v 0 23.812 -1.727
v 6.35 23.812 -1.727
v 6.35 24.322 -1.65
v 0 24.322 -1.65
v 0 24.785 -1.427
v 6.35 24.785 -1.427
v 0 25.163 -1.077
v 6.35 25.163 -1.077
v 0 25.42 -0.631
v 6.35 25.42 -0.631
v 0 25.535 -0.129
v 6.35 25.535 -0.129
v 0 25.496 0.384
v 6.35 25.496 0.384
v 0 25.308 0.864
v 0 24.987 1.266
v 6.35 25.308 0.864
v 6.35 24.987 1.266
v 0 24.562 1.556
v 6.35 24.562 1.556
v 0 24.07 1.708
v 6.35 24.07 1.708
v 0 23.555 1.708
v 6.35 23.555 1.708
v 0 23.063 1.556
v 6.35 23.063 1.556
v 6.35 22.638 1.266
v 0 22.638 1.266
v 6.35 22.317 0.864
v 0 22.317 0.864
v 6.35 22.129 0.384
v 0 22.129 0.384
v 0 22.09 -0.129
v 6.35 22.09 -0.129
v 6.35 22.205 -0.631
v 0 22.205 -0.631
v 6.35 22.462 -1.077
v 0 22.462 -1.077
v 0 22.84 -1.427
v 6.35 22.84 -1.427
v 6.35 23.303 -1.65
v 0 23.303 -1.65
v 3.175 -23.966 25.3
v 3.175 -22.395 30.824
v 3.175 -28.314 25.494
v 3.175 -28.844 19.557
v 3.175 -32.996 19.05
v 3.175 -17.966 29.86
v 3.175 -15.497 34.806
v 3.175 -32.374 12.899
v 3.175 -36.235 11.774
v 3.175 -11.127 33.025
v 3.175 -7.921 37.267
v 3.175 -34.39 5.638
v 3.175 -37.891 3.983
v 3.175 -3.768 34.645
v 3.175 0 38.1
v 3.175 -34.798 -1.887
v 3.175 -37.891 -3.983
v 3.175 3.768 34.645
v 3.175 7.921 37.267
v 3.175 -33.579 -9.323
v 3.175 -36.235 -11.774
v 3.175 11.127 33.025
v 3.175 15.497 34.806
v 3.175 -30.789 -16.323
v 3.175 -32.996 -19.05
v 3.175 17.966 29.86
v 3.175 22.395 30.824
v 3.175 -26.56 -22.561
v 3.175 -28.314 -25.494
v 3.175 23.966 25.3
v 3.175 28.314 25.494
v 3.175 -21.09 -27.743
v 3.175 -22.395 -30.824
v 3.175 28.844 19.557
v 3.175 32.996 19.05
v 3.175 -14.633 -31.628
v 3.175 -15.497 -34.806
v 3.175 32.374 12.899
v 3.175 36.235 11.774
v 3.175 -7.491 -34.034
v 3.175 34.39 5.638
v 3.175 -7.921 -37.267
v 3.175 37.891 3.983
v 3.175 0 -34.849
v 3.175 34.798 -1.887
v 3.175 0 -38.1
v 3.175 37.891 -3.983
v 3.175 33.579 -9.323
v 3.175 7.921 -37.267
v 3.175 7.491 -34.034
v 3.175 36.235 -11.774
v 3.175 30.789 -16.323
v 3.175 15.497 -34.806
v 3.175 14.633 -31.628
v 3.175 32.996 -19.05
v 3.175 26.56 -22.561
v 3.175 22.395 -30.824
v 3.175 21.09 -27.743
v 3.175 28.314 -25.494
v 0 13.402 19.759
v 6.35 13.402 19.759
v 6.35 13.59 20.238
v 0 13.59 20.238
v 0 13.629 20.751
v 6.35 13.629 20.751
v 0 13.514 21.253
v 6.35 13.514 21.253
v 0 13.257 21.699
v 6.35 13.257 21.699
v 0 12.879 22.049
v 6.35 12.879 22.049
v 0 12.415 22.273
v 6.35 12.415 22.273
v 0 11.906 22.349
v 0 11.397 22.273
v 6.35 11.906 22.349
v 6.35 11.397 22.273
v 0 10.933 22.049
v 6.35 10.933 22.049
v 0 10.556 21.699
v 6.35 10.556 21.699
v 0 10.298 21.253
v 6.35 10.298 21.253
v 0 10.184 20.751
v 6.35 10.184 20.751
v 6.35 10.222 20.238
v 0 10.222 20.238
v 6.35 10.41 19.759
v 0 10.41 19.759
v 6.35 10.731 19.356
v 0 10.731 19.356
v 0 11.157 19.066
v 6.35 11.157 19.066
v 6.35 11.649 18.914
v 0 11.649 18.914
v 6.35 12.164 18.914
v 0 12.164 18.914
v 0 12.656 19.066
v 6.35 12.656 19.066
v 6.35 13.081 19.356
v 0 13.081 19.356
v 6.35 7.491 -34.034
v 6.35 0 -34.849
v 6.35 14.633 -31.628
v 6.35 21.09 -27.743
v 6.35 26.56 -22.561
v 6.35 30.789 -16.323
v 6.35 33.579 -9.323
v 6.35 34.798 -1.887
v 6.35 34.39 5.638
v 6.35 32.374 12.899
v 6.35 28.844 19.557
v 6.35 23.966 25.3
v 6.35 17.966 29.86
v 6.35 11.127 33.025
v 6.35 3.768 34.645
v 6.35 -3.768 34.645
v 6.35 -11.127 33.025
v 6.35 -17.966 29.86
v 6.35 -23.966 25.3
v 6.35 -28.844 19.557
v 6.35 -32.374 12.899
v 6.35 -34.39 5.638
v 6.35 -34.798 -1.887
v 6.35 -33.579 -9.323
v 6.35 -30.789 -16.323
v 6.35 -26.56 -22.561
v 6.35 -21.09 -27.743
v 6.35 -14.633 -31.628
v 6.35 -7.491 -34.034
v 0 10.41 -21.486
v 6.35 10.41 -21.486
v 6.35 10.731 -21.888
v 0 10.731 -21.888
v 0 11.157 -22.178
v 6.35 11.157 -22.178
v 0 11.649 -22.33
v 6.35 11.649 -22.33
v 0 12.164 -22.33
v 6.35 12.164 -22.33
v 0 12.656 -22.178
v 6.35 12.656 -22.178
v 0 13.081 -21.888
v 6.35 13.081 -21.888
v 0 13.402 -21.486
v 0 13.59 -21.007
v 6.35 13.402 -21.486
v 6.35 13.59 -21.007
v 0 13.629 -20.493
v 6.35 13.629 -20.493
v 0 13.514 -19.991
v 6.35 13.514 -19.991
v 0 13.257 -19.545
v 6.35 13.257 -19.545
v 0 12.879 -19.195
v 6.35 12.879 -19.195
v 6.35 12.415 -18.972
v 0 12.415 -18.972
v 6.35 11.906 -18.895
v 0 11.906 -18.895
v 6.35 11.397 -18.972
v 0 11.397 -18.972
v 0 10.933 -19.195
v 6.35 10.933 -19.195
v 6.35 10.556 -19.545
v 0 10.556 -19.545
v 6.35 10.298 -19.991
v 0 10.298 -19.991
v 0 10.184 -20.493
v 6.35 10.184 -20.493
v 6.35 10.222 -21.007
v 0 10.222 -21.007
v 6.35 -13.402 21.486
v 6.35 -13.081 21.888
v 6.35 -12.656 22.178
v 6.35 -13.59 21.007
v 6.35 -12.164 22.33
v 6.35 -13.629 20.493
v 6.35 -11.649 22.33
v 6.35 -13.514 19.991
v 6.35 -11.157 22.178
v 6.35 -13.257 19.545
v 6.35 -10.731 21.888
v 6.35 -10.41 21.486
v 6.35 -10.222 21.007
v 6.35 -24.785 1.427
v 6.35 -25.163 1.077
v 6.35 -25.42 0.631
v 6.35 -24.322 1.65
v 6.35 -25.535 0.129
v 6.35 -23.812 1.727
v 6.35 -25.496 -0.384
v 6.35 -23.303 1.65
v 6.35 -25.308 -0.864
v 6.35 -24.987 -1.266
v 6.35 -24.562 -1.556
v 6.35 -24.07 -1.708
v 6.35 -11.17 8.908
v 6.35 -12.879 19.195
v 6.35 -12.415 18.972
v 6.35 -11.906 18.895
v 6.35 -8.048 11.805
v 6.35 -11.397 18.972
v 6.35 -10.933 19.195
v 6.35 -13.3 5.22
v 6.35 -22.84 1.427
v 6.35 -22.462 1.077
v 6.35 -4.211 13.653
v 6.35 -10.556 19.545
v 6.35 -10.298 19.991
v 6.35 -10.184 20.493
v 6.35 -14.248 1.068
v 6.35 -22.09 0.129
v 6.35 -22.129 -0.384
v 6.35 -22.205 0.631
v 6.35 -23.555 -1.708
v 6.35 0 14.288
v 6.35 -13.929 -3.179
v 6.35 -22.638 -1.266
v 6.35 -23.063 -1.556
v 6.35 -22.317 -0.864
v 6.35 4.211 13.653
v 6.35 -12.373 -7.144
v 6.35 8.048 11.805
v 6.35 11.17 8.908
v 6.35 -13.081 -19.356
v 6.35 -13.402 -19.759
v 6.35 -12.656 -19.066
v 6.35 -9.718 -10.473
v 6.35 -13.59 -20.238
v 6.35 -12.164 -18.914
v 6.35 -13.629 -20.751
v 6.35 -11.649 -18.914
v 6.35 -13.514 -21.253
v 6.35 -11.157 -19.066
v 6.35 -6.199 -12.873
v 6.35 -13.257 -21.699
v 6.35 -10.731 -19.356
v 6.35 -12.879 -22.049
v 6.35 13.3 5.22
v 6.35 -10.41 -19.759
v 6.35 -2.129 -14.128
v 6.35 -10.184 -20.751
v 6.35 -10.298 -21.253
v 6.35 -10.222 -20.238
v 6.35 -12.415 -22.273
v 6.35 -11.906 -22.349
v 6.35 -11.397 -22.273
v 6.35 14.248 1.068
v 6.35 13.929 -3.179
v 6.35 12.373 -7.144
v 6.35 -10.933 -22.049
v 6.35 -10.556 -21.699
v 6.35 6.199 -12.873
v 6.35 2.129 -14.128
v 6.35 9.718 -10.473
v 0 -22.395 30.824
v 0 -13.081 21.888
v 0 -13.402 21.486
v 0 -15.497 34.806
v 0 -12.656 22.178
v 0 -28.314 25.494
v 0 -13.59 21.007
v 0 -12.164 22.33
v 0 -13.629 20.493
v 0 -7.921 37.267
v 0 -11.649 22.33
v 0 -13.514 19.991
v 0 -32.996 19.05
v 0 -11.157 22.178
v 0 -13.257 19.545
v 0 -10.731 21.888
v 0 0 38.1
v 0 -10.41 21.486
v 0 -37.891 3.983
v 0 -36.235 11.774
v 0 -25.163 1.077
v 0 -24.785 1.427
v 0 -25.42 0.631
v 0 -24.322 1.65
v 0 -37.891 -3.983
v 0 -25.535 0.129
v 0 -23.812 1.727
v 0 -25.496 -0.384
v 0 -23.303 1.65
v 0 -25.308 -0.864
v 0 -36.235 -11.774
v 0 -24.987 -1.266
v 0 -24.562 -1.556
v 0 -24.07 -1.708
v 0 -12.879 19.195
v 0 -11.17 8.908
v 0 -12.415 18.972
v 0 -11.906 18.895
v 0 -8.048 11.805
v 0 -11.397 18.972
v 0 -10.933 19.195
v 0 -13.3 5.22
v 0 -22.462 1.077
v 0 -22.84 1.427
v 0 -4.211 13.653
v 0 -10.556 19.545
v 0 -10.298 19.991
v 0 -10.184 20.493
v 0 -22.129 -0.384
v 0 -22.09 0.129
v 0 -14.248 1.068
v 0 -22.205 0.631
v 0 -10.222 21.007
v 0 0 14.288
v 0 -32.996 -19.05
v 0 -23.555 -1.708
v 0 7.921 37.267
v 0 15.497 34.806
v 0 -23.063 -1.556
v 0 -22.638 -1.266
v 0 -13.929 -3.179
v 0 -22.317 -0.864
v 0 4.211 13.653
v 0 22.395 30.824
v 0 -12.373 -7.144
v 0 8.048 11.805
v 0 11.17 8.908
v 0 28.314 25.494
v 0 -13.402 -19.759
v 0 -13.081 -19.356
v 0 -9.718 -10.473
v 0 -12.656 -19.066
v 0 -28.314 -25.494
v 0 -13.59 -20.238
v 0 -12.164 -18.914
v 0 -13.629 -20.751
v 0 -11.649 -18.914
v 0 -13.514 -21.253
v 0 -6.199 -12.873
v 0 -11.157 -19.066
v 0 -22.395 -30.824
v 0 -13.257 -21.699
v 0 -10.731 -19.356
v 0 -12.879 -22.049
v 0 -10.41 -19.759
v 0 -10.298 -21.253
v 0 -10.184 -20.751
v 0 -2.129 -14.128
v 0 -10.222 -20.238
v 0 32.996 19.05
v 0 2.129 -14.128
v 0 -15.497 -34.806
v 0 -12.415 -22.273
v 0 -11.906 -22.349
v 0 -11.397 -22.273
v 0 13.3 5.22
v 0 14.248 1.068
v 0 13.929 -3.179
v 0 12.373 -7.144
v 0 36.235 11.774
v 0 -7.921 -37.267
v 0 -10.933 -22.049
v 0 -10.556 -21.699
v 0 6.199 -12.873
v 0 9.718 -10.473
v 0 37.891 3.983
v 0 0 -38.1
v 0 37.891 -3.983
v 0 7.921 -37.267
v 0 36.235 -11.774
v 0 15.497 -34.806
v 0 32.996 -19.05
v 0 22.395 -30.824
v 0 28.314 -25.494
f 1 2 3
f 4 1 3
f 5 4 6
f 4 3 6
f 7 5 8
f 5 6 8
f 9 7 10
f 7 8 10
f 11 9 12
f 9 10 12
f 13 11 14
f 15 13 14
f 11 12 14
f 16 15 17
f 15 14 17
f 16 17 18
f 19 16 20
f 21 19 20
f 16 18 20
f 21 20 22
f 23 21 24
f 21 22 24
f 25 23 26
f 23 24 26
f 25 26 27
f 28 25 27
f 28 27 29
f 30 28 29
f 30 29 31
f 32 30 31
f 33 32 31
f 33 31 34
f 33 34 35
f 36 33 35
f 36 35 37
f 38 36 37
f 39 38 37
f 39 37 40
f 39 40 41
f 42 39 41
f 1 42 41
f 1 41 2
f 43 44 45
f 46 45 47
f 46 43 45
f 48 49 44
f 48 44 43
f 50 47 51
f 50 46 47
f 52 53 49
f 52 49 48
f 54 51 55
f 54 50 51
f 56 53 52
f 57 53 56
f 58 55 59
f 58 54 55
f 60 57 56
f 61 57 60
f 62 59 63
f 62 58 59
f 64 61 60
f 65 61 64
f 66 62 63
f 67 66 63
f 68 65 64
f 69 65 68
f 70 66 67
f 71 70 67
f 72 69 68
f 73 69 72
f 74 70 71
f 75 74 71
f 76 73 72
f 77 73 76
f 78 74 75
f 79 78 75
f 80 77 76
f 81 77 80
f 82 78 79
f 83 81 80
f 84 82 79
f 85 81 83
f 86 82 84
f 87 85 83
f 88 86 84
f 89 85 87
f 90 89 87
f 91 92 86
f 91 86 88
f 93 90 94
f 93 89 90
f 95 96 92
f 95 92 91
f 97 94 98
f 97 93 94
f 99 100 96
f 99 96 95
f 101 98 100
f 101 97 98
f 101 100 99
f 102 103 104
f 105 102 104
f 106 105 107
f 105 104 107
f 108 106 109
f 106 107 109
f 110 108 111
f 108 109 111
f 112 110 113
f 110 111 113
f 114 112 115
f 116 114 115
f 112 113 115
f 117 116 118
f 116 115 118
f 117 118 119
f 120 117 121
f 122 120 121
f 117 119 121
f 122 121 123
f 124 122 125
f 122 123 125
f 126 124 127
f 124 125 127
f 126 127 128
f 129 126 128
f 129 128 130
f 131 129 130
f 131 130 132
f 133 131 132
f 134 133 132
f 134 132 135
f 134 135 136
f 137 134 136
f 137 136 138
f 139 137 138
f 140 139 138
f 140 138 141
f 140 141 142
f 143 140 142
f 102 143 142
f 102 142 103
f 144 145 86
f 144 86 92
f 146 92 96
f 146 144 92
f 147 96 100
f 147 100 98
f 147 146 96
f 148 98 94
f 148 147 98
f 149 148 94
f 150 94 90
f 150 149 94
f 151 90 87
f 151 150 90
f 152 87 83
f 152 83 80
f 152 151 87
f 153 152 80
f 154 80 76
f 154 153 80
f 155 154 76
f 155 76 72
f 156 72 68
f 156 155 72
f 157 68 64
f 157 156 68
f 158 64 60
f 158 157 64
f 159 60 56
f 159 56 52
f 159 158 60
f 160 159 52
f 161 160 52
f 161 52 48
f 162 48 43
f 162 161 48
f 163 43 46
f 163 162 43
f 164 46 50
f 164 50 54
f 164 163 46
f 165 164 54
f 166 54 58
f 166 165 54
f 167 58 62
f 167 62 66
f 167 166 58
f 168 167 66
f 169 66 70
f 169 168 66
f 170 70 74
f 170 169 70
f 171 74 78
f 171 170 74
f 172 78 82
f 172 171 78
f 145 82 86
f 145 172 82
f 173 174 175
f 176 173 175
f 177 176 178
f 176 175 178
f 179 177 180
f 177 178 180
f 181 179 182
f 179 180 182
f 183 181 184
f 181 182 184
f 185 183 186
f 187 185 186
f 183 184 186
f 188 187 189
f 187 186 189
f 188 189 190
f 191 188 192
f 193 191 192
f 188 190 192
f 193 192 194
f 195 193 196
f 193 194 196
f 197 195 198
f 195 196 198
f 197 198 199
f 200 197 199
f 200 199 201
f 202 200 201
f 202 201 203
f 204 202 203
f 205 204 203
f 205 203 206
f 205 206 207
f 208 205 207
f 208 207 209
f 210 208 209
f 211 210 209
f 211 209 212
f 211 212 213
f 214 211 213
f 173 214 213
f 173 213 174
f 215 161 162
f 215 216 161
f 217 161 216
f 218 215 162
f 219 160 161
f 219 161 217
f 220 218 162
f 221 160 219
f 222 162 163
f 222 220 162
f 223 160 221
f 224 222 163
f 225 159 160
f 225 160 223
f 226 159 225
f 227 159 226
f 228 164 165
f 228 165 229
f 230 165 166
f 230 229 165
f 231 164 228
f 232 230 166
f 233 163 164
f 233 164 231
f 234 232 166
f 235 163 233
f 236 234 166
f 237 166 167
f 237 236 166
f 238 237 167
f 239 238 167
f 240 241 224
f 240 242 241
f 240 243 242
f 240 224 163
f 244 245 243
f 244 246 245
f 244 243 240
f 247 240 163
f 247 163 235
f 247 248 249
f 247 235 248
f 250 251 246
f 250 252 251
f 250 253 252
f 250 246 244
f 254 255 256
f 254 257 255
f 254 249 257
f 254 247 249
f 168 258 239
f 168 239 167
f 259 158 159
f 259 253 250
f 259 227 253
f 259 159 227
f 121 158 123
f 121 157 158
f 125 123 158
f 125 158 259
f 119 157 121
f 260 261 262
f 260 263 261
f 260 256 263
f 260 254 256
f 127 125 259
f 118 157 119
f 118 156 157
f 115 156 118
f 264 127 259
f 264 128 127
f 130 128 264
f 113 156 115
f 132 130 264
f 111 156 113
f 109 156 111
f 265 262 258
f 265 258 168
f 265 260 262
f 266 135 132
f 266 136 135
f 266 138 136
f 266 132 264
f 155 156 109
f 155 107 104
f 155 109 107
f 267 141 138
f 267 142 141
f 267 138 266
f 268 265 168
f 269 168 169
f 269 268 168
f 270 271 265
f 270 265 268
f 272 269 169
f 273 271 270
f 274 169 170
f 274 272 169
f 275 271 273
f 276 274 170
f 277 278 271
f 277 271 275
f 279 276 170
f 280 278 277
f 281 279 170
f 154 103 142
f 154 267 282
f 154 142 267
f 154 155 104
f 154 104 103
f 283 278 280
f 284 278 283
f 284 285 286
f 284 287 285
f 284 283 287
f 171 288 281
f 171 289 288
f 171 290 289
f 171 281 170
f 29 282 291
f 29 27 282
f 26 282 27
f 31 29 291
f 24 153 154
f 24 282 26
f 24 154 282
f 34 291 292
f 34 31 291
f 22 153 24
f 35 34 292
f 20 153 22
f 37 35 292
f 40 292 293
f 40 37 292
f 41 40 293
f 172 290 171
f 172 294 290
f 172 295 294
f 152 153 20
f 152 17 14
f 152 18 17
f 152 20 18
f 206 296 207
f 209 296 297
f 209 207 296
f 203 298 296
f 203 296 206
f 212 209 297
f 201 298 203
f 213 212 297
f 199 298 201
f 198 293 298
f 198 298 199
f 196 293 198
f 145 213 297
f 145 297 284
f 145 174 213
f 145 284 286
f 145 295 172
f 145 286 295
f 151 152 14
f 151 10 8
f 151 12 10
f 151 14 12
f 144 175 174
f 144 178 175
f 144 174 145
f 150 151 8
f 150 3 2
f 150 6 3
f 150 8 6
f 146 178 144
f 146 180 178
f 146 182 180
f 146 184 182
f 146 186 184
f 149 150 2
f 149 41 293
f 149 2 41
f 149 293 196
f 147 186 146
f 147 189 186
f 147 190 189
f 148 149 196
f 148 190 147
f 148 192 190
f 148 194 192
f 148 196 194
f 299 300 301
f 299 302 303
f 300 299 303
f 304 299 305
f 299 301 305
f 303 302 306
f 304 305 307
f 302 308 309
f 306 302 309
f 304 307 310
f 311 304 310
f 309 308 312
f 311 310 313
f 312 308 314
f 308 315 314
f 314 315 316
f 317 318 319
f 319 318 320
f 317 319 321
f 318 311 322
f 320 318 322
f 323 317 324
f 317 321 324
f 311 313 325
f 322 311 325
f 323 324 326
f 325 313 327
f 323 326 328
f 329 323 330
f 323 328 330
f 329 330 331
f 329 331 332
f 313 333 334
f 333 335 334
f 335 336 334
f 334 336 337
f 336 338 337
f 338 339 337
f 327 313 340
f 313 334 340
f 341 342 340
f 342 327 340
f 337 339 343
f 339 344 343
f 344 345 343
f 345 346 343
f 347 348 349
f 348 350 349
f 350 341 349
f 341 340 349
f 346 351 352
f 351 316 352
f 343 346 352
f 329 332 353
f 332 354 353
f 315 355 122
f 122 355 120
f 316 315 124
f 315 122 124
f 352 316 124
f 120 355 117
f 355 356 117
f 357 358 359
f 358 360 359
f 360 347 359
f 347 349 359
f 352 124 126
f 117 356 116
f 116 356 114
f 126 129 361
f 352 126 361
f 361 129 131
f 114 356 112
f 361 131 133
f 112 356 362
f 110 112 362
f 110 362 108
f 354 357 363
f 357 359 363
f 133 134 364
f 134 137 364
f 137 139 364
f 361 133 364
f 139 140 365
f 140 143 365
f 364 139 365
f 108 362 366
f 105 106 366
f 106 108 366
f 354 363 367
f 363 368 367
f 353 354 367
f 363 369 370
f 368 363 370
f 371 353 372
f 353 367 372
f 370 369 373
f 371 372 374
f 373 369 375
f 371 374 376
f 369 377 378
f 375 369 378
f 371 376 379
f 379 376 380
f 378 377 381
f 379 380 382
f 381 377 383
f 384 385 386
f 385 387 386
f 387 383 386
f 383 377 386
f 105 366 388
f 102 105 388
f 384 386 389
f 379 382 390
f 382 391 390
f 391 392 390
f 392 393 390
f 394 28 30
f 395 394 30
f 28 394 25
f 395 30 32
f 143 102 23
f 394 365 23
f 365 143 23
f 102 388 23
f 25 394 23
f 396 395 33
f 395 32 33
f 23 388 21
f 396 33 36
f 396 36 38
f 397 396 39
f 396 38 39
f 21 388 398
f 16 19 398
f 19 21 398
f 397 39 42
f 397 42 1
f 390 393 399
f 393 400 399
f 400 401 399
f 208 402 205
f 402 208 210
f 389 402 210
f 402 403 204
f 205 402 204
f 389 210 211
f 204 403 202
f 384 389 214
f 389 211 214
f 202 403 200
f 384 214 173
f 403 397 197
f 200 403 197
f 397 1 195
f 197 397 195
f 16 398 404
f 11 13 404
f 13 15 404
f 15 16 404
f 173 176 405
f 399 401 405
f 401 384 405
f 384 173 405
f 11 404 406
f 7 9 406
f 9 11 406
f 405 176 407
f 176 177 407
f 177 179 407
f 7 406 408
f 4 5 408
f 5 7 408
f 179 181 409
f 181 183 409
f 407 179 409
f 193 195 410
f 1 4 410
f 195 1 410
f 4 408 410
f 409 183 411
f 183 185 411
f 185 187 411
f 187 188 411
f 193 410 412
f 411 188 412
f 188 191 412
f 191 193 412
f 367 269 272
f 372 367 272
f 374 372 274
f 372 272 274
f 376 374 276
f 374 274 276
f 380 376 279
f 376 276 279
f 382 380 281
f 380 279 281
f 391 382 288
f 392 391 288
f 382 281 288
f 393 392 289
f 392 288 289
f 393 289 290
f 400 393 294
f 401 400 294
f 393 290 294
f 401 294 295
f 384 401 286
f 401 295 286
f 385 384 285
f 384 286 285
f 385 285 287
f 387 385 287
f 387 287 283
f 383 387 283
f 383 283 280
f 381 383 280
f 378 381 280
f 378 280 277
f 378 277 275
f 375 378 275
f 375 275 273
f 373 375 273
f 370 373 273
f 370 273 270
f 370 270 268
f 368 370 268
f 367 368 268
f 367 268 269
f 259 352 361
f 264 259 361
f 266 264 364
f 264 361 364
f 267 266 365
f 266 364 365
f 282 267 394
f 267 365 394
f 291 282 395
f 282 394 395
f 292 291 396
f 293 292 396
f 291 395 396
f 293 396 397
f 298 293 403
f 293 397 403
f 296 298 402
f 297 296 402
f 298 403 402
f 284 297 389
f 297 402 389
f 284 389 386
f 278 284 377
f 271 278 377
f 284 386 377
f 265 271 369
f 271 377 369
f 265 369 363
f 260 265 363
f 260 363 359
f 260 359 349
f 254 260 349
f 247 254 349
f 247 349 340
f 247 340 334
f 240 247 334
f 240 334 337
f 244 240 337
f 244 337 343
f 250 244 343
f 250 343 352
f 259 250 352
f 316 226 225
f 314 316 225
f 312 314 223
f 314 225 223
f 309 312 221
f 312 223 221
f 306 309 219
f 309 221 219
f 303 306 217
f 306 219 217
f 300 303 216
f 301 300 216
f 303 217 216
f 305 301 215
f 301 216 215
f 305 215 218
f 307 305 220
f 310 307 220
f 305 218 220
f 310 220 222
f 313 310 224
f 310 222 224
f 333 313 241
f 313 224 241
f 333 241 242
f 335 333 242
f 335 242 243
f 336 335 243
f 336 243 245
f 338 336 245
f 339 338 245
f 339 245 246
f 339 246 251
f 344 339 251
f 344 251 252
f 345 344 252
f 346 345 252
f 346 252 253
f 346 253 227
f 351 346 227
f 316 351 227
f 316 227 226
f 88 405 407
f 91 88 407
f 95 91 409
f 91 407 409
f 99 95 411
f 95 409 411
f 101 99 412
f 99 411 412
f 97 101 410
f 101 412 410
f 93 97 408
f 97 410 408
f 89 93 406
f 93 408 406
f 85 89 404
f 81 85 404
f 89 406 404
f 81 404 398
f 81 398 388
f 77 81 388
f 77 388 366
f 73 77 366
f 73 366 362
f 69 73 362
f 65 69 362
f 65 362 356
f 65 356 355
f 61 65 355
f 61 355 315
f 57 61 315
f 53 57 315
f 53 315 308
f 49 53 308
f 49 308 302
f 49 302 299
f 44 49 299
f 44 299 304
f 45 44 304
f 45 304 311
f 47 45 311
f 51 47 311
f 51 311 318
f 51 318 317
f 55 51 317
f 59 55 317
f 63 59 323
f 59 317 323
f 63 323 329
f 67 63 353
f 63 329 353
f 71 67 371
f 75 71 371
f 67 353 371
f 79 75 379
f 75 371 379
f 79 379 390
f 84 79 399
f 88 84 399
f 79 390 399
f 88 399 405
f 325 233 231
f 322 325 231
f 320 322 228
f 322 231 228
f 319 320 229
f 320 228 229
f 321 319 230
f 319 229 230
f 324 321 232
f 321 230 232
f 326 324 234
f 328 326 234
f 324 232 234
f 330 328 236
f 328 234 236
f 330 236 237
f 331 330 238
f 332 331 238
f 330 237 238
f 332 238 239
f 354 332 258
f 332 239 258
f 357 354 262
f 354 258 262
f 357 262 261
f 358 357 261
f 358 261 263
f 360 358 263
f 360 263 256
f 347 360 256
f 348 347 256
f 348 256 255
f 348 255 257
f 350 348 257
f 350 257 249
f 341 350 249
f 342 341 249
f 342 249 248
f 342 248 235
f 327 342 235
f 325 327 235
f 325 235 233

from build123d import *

# Parameters (mm, degrees)
SKETCH1_R                  = 38.1
BOSS_EXTRUDE1_DEPTH        = 6.35
SKETCH3_R                  = 38.1
SKETCH3_R_2                = 34.8488
CUT_EXTRUDE_THIN1_DEPTH    = 3.175
F_1_2_0_5_DIAMETER_HOLE1_D = 28.575
F_8_32_TAPPED_HOLE1_D      = 3.4544
CIRPATTERN1_COUNT          = 6


with BuildPart() as part:
    # Sketch1 → Boss-Extrude1 (new body)
    with BuildSketch(Plane(origin=(0, 0, 0), x_dir=(0, 0, -1), z_dir=(1, 0, 0))):
        Circle(SKETCH1_R)
    extrude(amount=BOSS_EXTRUDE1_DEPTH)

    # Sketch3 → Cut-Extrude-Thin1 (cut)
    with BuildSketch(Plane(origin=(6.35, 0, 0), x_dir=(0, 0, -1), z_dir=(1, 0, 0))):
        Circle(SKETCH3_R)
        Circle(SKETCH3_R_2, mode=Mode.SUBTRACT)
    extrude(amount=-CUT_EXTRUDE_THIN1_DEPTH, mode=Mode.SUBTRACT)

    # 1/2 (0.5) Diameter Hole1 (through all)
    with Locations(Plane(origin=(6.35, 0, 0), x_dir=(0, 0, -1), z_dir=(1, 0, 0))):
        with Locations((0, 0)):
            Hole(F_1_2_0_5_DIAMETER_HOLE1_D / 2)

    # #8-32 Tapped Hole1 (through all)
    with Locations(Plane.ZY):
        with Locations((0, 23.8125)):
            f_8_32_tapped_hole1 = Hole(F_8_32_TAPPED_HOLE1_D / 2)

    # CirPattern1: #8-32 Tapped Hole1 ×6 about axis
    cirpattern1_axis = Axis((0, 0, 0), (1, 0, 0))
    for i in range(1, CIRPATTERN1_COUNT):
        add(f_8_32_tapped_hole1.rotate(cirpattern1_axis, i * 360 / CIRPATTERN1_COUNT), mode=Mode.SUBTRACT)


solid = part.part
